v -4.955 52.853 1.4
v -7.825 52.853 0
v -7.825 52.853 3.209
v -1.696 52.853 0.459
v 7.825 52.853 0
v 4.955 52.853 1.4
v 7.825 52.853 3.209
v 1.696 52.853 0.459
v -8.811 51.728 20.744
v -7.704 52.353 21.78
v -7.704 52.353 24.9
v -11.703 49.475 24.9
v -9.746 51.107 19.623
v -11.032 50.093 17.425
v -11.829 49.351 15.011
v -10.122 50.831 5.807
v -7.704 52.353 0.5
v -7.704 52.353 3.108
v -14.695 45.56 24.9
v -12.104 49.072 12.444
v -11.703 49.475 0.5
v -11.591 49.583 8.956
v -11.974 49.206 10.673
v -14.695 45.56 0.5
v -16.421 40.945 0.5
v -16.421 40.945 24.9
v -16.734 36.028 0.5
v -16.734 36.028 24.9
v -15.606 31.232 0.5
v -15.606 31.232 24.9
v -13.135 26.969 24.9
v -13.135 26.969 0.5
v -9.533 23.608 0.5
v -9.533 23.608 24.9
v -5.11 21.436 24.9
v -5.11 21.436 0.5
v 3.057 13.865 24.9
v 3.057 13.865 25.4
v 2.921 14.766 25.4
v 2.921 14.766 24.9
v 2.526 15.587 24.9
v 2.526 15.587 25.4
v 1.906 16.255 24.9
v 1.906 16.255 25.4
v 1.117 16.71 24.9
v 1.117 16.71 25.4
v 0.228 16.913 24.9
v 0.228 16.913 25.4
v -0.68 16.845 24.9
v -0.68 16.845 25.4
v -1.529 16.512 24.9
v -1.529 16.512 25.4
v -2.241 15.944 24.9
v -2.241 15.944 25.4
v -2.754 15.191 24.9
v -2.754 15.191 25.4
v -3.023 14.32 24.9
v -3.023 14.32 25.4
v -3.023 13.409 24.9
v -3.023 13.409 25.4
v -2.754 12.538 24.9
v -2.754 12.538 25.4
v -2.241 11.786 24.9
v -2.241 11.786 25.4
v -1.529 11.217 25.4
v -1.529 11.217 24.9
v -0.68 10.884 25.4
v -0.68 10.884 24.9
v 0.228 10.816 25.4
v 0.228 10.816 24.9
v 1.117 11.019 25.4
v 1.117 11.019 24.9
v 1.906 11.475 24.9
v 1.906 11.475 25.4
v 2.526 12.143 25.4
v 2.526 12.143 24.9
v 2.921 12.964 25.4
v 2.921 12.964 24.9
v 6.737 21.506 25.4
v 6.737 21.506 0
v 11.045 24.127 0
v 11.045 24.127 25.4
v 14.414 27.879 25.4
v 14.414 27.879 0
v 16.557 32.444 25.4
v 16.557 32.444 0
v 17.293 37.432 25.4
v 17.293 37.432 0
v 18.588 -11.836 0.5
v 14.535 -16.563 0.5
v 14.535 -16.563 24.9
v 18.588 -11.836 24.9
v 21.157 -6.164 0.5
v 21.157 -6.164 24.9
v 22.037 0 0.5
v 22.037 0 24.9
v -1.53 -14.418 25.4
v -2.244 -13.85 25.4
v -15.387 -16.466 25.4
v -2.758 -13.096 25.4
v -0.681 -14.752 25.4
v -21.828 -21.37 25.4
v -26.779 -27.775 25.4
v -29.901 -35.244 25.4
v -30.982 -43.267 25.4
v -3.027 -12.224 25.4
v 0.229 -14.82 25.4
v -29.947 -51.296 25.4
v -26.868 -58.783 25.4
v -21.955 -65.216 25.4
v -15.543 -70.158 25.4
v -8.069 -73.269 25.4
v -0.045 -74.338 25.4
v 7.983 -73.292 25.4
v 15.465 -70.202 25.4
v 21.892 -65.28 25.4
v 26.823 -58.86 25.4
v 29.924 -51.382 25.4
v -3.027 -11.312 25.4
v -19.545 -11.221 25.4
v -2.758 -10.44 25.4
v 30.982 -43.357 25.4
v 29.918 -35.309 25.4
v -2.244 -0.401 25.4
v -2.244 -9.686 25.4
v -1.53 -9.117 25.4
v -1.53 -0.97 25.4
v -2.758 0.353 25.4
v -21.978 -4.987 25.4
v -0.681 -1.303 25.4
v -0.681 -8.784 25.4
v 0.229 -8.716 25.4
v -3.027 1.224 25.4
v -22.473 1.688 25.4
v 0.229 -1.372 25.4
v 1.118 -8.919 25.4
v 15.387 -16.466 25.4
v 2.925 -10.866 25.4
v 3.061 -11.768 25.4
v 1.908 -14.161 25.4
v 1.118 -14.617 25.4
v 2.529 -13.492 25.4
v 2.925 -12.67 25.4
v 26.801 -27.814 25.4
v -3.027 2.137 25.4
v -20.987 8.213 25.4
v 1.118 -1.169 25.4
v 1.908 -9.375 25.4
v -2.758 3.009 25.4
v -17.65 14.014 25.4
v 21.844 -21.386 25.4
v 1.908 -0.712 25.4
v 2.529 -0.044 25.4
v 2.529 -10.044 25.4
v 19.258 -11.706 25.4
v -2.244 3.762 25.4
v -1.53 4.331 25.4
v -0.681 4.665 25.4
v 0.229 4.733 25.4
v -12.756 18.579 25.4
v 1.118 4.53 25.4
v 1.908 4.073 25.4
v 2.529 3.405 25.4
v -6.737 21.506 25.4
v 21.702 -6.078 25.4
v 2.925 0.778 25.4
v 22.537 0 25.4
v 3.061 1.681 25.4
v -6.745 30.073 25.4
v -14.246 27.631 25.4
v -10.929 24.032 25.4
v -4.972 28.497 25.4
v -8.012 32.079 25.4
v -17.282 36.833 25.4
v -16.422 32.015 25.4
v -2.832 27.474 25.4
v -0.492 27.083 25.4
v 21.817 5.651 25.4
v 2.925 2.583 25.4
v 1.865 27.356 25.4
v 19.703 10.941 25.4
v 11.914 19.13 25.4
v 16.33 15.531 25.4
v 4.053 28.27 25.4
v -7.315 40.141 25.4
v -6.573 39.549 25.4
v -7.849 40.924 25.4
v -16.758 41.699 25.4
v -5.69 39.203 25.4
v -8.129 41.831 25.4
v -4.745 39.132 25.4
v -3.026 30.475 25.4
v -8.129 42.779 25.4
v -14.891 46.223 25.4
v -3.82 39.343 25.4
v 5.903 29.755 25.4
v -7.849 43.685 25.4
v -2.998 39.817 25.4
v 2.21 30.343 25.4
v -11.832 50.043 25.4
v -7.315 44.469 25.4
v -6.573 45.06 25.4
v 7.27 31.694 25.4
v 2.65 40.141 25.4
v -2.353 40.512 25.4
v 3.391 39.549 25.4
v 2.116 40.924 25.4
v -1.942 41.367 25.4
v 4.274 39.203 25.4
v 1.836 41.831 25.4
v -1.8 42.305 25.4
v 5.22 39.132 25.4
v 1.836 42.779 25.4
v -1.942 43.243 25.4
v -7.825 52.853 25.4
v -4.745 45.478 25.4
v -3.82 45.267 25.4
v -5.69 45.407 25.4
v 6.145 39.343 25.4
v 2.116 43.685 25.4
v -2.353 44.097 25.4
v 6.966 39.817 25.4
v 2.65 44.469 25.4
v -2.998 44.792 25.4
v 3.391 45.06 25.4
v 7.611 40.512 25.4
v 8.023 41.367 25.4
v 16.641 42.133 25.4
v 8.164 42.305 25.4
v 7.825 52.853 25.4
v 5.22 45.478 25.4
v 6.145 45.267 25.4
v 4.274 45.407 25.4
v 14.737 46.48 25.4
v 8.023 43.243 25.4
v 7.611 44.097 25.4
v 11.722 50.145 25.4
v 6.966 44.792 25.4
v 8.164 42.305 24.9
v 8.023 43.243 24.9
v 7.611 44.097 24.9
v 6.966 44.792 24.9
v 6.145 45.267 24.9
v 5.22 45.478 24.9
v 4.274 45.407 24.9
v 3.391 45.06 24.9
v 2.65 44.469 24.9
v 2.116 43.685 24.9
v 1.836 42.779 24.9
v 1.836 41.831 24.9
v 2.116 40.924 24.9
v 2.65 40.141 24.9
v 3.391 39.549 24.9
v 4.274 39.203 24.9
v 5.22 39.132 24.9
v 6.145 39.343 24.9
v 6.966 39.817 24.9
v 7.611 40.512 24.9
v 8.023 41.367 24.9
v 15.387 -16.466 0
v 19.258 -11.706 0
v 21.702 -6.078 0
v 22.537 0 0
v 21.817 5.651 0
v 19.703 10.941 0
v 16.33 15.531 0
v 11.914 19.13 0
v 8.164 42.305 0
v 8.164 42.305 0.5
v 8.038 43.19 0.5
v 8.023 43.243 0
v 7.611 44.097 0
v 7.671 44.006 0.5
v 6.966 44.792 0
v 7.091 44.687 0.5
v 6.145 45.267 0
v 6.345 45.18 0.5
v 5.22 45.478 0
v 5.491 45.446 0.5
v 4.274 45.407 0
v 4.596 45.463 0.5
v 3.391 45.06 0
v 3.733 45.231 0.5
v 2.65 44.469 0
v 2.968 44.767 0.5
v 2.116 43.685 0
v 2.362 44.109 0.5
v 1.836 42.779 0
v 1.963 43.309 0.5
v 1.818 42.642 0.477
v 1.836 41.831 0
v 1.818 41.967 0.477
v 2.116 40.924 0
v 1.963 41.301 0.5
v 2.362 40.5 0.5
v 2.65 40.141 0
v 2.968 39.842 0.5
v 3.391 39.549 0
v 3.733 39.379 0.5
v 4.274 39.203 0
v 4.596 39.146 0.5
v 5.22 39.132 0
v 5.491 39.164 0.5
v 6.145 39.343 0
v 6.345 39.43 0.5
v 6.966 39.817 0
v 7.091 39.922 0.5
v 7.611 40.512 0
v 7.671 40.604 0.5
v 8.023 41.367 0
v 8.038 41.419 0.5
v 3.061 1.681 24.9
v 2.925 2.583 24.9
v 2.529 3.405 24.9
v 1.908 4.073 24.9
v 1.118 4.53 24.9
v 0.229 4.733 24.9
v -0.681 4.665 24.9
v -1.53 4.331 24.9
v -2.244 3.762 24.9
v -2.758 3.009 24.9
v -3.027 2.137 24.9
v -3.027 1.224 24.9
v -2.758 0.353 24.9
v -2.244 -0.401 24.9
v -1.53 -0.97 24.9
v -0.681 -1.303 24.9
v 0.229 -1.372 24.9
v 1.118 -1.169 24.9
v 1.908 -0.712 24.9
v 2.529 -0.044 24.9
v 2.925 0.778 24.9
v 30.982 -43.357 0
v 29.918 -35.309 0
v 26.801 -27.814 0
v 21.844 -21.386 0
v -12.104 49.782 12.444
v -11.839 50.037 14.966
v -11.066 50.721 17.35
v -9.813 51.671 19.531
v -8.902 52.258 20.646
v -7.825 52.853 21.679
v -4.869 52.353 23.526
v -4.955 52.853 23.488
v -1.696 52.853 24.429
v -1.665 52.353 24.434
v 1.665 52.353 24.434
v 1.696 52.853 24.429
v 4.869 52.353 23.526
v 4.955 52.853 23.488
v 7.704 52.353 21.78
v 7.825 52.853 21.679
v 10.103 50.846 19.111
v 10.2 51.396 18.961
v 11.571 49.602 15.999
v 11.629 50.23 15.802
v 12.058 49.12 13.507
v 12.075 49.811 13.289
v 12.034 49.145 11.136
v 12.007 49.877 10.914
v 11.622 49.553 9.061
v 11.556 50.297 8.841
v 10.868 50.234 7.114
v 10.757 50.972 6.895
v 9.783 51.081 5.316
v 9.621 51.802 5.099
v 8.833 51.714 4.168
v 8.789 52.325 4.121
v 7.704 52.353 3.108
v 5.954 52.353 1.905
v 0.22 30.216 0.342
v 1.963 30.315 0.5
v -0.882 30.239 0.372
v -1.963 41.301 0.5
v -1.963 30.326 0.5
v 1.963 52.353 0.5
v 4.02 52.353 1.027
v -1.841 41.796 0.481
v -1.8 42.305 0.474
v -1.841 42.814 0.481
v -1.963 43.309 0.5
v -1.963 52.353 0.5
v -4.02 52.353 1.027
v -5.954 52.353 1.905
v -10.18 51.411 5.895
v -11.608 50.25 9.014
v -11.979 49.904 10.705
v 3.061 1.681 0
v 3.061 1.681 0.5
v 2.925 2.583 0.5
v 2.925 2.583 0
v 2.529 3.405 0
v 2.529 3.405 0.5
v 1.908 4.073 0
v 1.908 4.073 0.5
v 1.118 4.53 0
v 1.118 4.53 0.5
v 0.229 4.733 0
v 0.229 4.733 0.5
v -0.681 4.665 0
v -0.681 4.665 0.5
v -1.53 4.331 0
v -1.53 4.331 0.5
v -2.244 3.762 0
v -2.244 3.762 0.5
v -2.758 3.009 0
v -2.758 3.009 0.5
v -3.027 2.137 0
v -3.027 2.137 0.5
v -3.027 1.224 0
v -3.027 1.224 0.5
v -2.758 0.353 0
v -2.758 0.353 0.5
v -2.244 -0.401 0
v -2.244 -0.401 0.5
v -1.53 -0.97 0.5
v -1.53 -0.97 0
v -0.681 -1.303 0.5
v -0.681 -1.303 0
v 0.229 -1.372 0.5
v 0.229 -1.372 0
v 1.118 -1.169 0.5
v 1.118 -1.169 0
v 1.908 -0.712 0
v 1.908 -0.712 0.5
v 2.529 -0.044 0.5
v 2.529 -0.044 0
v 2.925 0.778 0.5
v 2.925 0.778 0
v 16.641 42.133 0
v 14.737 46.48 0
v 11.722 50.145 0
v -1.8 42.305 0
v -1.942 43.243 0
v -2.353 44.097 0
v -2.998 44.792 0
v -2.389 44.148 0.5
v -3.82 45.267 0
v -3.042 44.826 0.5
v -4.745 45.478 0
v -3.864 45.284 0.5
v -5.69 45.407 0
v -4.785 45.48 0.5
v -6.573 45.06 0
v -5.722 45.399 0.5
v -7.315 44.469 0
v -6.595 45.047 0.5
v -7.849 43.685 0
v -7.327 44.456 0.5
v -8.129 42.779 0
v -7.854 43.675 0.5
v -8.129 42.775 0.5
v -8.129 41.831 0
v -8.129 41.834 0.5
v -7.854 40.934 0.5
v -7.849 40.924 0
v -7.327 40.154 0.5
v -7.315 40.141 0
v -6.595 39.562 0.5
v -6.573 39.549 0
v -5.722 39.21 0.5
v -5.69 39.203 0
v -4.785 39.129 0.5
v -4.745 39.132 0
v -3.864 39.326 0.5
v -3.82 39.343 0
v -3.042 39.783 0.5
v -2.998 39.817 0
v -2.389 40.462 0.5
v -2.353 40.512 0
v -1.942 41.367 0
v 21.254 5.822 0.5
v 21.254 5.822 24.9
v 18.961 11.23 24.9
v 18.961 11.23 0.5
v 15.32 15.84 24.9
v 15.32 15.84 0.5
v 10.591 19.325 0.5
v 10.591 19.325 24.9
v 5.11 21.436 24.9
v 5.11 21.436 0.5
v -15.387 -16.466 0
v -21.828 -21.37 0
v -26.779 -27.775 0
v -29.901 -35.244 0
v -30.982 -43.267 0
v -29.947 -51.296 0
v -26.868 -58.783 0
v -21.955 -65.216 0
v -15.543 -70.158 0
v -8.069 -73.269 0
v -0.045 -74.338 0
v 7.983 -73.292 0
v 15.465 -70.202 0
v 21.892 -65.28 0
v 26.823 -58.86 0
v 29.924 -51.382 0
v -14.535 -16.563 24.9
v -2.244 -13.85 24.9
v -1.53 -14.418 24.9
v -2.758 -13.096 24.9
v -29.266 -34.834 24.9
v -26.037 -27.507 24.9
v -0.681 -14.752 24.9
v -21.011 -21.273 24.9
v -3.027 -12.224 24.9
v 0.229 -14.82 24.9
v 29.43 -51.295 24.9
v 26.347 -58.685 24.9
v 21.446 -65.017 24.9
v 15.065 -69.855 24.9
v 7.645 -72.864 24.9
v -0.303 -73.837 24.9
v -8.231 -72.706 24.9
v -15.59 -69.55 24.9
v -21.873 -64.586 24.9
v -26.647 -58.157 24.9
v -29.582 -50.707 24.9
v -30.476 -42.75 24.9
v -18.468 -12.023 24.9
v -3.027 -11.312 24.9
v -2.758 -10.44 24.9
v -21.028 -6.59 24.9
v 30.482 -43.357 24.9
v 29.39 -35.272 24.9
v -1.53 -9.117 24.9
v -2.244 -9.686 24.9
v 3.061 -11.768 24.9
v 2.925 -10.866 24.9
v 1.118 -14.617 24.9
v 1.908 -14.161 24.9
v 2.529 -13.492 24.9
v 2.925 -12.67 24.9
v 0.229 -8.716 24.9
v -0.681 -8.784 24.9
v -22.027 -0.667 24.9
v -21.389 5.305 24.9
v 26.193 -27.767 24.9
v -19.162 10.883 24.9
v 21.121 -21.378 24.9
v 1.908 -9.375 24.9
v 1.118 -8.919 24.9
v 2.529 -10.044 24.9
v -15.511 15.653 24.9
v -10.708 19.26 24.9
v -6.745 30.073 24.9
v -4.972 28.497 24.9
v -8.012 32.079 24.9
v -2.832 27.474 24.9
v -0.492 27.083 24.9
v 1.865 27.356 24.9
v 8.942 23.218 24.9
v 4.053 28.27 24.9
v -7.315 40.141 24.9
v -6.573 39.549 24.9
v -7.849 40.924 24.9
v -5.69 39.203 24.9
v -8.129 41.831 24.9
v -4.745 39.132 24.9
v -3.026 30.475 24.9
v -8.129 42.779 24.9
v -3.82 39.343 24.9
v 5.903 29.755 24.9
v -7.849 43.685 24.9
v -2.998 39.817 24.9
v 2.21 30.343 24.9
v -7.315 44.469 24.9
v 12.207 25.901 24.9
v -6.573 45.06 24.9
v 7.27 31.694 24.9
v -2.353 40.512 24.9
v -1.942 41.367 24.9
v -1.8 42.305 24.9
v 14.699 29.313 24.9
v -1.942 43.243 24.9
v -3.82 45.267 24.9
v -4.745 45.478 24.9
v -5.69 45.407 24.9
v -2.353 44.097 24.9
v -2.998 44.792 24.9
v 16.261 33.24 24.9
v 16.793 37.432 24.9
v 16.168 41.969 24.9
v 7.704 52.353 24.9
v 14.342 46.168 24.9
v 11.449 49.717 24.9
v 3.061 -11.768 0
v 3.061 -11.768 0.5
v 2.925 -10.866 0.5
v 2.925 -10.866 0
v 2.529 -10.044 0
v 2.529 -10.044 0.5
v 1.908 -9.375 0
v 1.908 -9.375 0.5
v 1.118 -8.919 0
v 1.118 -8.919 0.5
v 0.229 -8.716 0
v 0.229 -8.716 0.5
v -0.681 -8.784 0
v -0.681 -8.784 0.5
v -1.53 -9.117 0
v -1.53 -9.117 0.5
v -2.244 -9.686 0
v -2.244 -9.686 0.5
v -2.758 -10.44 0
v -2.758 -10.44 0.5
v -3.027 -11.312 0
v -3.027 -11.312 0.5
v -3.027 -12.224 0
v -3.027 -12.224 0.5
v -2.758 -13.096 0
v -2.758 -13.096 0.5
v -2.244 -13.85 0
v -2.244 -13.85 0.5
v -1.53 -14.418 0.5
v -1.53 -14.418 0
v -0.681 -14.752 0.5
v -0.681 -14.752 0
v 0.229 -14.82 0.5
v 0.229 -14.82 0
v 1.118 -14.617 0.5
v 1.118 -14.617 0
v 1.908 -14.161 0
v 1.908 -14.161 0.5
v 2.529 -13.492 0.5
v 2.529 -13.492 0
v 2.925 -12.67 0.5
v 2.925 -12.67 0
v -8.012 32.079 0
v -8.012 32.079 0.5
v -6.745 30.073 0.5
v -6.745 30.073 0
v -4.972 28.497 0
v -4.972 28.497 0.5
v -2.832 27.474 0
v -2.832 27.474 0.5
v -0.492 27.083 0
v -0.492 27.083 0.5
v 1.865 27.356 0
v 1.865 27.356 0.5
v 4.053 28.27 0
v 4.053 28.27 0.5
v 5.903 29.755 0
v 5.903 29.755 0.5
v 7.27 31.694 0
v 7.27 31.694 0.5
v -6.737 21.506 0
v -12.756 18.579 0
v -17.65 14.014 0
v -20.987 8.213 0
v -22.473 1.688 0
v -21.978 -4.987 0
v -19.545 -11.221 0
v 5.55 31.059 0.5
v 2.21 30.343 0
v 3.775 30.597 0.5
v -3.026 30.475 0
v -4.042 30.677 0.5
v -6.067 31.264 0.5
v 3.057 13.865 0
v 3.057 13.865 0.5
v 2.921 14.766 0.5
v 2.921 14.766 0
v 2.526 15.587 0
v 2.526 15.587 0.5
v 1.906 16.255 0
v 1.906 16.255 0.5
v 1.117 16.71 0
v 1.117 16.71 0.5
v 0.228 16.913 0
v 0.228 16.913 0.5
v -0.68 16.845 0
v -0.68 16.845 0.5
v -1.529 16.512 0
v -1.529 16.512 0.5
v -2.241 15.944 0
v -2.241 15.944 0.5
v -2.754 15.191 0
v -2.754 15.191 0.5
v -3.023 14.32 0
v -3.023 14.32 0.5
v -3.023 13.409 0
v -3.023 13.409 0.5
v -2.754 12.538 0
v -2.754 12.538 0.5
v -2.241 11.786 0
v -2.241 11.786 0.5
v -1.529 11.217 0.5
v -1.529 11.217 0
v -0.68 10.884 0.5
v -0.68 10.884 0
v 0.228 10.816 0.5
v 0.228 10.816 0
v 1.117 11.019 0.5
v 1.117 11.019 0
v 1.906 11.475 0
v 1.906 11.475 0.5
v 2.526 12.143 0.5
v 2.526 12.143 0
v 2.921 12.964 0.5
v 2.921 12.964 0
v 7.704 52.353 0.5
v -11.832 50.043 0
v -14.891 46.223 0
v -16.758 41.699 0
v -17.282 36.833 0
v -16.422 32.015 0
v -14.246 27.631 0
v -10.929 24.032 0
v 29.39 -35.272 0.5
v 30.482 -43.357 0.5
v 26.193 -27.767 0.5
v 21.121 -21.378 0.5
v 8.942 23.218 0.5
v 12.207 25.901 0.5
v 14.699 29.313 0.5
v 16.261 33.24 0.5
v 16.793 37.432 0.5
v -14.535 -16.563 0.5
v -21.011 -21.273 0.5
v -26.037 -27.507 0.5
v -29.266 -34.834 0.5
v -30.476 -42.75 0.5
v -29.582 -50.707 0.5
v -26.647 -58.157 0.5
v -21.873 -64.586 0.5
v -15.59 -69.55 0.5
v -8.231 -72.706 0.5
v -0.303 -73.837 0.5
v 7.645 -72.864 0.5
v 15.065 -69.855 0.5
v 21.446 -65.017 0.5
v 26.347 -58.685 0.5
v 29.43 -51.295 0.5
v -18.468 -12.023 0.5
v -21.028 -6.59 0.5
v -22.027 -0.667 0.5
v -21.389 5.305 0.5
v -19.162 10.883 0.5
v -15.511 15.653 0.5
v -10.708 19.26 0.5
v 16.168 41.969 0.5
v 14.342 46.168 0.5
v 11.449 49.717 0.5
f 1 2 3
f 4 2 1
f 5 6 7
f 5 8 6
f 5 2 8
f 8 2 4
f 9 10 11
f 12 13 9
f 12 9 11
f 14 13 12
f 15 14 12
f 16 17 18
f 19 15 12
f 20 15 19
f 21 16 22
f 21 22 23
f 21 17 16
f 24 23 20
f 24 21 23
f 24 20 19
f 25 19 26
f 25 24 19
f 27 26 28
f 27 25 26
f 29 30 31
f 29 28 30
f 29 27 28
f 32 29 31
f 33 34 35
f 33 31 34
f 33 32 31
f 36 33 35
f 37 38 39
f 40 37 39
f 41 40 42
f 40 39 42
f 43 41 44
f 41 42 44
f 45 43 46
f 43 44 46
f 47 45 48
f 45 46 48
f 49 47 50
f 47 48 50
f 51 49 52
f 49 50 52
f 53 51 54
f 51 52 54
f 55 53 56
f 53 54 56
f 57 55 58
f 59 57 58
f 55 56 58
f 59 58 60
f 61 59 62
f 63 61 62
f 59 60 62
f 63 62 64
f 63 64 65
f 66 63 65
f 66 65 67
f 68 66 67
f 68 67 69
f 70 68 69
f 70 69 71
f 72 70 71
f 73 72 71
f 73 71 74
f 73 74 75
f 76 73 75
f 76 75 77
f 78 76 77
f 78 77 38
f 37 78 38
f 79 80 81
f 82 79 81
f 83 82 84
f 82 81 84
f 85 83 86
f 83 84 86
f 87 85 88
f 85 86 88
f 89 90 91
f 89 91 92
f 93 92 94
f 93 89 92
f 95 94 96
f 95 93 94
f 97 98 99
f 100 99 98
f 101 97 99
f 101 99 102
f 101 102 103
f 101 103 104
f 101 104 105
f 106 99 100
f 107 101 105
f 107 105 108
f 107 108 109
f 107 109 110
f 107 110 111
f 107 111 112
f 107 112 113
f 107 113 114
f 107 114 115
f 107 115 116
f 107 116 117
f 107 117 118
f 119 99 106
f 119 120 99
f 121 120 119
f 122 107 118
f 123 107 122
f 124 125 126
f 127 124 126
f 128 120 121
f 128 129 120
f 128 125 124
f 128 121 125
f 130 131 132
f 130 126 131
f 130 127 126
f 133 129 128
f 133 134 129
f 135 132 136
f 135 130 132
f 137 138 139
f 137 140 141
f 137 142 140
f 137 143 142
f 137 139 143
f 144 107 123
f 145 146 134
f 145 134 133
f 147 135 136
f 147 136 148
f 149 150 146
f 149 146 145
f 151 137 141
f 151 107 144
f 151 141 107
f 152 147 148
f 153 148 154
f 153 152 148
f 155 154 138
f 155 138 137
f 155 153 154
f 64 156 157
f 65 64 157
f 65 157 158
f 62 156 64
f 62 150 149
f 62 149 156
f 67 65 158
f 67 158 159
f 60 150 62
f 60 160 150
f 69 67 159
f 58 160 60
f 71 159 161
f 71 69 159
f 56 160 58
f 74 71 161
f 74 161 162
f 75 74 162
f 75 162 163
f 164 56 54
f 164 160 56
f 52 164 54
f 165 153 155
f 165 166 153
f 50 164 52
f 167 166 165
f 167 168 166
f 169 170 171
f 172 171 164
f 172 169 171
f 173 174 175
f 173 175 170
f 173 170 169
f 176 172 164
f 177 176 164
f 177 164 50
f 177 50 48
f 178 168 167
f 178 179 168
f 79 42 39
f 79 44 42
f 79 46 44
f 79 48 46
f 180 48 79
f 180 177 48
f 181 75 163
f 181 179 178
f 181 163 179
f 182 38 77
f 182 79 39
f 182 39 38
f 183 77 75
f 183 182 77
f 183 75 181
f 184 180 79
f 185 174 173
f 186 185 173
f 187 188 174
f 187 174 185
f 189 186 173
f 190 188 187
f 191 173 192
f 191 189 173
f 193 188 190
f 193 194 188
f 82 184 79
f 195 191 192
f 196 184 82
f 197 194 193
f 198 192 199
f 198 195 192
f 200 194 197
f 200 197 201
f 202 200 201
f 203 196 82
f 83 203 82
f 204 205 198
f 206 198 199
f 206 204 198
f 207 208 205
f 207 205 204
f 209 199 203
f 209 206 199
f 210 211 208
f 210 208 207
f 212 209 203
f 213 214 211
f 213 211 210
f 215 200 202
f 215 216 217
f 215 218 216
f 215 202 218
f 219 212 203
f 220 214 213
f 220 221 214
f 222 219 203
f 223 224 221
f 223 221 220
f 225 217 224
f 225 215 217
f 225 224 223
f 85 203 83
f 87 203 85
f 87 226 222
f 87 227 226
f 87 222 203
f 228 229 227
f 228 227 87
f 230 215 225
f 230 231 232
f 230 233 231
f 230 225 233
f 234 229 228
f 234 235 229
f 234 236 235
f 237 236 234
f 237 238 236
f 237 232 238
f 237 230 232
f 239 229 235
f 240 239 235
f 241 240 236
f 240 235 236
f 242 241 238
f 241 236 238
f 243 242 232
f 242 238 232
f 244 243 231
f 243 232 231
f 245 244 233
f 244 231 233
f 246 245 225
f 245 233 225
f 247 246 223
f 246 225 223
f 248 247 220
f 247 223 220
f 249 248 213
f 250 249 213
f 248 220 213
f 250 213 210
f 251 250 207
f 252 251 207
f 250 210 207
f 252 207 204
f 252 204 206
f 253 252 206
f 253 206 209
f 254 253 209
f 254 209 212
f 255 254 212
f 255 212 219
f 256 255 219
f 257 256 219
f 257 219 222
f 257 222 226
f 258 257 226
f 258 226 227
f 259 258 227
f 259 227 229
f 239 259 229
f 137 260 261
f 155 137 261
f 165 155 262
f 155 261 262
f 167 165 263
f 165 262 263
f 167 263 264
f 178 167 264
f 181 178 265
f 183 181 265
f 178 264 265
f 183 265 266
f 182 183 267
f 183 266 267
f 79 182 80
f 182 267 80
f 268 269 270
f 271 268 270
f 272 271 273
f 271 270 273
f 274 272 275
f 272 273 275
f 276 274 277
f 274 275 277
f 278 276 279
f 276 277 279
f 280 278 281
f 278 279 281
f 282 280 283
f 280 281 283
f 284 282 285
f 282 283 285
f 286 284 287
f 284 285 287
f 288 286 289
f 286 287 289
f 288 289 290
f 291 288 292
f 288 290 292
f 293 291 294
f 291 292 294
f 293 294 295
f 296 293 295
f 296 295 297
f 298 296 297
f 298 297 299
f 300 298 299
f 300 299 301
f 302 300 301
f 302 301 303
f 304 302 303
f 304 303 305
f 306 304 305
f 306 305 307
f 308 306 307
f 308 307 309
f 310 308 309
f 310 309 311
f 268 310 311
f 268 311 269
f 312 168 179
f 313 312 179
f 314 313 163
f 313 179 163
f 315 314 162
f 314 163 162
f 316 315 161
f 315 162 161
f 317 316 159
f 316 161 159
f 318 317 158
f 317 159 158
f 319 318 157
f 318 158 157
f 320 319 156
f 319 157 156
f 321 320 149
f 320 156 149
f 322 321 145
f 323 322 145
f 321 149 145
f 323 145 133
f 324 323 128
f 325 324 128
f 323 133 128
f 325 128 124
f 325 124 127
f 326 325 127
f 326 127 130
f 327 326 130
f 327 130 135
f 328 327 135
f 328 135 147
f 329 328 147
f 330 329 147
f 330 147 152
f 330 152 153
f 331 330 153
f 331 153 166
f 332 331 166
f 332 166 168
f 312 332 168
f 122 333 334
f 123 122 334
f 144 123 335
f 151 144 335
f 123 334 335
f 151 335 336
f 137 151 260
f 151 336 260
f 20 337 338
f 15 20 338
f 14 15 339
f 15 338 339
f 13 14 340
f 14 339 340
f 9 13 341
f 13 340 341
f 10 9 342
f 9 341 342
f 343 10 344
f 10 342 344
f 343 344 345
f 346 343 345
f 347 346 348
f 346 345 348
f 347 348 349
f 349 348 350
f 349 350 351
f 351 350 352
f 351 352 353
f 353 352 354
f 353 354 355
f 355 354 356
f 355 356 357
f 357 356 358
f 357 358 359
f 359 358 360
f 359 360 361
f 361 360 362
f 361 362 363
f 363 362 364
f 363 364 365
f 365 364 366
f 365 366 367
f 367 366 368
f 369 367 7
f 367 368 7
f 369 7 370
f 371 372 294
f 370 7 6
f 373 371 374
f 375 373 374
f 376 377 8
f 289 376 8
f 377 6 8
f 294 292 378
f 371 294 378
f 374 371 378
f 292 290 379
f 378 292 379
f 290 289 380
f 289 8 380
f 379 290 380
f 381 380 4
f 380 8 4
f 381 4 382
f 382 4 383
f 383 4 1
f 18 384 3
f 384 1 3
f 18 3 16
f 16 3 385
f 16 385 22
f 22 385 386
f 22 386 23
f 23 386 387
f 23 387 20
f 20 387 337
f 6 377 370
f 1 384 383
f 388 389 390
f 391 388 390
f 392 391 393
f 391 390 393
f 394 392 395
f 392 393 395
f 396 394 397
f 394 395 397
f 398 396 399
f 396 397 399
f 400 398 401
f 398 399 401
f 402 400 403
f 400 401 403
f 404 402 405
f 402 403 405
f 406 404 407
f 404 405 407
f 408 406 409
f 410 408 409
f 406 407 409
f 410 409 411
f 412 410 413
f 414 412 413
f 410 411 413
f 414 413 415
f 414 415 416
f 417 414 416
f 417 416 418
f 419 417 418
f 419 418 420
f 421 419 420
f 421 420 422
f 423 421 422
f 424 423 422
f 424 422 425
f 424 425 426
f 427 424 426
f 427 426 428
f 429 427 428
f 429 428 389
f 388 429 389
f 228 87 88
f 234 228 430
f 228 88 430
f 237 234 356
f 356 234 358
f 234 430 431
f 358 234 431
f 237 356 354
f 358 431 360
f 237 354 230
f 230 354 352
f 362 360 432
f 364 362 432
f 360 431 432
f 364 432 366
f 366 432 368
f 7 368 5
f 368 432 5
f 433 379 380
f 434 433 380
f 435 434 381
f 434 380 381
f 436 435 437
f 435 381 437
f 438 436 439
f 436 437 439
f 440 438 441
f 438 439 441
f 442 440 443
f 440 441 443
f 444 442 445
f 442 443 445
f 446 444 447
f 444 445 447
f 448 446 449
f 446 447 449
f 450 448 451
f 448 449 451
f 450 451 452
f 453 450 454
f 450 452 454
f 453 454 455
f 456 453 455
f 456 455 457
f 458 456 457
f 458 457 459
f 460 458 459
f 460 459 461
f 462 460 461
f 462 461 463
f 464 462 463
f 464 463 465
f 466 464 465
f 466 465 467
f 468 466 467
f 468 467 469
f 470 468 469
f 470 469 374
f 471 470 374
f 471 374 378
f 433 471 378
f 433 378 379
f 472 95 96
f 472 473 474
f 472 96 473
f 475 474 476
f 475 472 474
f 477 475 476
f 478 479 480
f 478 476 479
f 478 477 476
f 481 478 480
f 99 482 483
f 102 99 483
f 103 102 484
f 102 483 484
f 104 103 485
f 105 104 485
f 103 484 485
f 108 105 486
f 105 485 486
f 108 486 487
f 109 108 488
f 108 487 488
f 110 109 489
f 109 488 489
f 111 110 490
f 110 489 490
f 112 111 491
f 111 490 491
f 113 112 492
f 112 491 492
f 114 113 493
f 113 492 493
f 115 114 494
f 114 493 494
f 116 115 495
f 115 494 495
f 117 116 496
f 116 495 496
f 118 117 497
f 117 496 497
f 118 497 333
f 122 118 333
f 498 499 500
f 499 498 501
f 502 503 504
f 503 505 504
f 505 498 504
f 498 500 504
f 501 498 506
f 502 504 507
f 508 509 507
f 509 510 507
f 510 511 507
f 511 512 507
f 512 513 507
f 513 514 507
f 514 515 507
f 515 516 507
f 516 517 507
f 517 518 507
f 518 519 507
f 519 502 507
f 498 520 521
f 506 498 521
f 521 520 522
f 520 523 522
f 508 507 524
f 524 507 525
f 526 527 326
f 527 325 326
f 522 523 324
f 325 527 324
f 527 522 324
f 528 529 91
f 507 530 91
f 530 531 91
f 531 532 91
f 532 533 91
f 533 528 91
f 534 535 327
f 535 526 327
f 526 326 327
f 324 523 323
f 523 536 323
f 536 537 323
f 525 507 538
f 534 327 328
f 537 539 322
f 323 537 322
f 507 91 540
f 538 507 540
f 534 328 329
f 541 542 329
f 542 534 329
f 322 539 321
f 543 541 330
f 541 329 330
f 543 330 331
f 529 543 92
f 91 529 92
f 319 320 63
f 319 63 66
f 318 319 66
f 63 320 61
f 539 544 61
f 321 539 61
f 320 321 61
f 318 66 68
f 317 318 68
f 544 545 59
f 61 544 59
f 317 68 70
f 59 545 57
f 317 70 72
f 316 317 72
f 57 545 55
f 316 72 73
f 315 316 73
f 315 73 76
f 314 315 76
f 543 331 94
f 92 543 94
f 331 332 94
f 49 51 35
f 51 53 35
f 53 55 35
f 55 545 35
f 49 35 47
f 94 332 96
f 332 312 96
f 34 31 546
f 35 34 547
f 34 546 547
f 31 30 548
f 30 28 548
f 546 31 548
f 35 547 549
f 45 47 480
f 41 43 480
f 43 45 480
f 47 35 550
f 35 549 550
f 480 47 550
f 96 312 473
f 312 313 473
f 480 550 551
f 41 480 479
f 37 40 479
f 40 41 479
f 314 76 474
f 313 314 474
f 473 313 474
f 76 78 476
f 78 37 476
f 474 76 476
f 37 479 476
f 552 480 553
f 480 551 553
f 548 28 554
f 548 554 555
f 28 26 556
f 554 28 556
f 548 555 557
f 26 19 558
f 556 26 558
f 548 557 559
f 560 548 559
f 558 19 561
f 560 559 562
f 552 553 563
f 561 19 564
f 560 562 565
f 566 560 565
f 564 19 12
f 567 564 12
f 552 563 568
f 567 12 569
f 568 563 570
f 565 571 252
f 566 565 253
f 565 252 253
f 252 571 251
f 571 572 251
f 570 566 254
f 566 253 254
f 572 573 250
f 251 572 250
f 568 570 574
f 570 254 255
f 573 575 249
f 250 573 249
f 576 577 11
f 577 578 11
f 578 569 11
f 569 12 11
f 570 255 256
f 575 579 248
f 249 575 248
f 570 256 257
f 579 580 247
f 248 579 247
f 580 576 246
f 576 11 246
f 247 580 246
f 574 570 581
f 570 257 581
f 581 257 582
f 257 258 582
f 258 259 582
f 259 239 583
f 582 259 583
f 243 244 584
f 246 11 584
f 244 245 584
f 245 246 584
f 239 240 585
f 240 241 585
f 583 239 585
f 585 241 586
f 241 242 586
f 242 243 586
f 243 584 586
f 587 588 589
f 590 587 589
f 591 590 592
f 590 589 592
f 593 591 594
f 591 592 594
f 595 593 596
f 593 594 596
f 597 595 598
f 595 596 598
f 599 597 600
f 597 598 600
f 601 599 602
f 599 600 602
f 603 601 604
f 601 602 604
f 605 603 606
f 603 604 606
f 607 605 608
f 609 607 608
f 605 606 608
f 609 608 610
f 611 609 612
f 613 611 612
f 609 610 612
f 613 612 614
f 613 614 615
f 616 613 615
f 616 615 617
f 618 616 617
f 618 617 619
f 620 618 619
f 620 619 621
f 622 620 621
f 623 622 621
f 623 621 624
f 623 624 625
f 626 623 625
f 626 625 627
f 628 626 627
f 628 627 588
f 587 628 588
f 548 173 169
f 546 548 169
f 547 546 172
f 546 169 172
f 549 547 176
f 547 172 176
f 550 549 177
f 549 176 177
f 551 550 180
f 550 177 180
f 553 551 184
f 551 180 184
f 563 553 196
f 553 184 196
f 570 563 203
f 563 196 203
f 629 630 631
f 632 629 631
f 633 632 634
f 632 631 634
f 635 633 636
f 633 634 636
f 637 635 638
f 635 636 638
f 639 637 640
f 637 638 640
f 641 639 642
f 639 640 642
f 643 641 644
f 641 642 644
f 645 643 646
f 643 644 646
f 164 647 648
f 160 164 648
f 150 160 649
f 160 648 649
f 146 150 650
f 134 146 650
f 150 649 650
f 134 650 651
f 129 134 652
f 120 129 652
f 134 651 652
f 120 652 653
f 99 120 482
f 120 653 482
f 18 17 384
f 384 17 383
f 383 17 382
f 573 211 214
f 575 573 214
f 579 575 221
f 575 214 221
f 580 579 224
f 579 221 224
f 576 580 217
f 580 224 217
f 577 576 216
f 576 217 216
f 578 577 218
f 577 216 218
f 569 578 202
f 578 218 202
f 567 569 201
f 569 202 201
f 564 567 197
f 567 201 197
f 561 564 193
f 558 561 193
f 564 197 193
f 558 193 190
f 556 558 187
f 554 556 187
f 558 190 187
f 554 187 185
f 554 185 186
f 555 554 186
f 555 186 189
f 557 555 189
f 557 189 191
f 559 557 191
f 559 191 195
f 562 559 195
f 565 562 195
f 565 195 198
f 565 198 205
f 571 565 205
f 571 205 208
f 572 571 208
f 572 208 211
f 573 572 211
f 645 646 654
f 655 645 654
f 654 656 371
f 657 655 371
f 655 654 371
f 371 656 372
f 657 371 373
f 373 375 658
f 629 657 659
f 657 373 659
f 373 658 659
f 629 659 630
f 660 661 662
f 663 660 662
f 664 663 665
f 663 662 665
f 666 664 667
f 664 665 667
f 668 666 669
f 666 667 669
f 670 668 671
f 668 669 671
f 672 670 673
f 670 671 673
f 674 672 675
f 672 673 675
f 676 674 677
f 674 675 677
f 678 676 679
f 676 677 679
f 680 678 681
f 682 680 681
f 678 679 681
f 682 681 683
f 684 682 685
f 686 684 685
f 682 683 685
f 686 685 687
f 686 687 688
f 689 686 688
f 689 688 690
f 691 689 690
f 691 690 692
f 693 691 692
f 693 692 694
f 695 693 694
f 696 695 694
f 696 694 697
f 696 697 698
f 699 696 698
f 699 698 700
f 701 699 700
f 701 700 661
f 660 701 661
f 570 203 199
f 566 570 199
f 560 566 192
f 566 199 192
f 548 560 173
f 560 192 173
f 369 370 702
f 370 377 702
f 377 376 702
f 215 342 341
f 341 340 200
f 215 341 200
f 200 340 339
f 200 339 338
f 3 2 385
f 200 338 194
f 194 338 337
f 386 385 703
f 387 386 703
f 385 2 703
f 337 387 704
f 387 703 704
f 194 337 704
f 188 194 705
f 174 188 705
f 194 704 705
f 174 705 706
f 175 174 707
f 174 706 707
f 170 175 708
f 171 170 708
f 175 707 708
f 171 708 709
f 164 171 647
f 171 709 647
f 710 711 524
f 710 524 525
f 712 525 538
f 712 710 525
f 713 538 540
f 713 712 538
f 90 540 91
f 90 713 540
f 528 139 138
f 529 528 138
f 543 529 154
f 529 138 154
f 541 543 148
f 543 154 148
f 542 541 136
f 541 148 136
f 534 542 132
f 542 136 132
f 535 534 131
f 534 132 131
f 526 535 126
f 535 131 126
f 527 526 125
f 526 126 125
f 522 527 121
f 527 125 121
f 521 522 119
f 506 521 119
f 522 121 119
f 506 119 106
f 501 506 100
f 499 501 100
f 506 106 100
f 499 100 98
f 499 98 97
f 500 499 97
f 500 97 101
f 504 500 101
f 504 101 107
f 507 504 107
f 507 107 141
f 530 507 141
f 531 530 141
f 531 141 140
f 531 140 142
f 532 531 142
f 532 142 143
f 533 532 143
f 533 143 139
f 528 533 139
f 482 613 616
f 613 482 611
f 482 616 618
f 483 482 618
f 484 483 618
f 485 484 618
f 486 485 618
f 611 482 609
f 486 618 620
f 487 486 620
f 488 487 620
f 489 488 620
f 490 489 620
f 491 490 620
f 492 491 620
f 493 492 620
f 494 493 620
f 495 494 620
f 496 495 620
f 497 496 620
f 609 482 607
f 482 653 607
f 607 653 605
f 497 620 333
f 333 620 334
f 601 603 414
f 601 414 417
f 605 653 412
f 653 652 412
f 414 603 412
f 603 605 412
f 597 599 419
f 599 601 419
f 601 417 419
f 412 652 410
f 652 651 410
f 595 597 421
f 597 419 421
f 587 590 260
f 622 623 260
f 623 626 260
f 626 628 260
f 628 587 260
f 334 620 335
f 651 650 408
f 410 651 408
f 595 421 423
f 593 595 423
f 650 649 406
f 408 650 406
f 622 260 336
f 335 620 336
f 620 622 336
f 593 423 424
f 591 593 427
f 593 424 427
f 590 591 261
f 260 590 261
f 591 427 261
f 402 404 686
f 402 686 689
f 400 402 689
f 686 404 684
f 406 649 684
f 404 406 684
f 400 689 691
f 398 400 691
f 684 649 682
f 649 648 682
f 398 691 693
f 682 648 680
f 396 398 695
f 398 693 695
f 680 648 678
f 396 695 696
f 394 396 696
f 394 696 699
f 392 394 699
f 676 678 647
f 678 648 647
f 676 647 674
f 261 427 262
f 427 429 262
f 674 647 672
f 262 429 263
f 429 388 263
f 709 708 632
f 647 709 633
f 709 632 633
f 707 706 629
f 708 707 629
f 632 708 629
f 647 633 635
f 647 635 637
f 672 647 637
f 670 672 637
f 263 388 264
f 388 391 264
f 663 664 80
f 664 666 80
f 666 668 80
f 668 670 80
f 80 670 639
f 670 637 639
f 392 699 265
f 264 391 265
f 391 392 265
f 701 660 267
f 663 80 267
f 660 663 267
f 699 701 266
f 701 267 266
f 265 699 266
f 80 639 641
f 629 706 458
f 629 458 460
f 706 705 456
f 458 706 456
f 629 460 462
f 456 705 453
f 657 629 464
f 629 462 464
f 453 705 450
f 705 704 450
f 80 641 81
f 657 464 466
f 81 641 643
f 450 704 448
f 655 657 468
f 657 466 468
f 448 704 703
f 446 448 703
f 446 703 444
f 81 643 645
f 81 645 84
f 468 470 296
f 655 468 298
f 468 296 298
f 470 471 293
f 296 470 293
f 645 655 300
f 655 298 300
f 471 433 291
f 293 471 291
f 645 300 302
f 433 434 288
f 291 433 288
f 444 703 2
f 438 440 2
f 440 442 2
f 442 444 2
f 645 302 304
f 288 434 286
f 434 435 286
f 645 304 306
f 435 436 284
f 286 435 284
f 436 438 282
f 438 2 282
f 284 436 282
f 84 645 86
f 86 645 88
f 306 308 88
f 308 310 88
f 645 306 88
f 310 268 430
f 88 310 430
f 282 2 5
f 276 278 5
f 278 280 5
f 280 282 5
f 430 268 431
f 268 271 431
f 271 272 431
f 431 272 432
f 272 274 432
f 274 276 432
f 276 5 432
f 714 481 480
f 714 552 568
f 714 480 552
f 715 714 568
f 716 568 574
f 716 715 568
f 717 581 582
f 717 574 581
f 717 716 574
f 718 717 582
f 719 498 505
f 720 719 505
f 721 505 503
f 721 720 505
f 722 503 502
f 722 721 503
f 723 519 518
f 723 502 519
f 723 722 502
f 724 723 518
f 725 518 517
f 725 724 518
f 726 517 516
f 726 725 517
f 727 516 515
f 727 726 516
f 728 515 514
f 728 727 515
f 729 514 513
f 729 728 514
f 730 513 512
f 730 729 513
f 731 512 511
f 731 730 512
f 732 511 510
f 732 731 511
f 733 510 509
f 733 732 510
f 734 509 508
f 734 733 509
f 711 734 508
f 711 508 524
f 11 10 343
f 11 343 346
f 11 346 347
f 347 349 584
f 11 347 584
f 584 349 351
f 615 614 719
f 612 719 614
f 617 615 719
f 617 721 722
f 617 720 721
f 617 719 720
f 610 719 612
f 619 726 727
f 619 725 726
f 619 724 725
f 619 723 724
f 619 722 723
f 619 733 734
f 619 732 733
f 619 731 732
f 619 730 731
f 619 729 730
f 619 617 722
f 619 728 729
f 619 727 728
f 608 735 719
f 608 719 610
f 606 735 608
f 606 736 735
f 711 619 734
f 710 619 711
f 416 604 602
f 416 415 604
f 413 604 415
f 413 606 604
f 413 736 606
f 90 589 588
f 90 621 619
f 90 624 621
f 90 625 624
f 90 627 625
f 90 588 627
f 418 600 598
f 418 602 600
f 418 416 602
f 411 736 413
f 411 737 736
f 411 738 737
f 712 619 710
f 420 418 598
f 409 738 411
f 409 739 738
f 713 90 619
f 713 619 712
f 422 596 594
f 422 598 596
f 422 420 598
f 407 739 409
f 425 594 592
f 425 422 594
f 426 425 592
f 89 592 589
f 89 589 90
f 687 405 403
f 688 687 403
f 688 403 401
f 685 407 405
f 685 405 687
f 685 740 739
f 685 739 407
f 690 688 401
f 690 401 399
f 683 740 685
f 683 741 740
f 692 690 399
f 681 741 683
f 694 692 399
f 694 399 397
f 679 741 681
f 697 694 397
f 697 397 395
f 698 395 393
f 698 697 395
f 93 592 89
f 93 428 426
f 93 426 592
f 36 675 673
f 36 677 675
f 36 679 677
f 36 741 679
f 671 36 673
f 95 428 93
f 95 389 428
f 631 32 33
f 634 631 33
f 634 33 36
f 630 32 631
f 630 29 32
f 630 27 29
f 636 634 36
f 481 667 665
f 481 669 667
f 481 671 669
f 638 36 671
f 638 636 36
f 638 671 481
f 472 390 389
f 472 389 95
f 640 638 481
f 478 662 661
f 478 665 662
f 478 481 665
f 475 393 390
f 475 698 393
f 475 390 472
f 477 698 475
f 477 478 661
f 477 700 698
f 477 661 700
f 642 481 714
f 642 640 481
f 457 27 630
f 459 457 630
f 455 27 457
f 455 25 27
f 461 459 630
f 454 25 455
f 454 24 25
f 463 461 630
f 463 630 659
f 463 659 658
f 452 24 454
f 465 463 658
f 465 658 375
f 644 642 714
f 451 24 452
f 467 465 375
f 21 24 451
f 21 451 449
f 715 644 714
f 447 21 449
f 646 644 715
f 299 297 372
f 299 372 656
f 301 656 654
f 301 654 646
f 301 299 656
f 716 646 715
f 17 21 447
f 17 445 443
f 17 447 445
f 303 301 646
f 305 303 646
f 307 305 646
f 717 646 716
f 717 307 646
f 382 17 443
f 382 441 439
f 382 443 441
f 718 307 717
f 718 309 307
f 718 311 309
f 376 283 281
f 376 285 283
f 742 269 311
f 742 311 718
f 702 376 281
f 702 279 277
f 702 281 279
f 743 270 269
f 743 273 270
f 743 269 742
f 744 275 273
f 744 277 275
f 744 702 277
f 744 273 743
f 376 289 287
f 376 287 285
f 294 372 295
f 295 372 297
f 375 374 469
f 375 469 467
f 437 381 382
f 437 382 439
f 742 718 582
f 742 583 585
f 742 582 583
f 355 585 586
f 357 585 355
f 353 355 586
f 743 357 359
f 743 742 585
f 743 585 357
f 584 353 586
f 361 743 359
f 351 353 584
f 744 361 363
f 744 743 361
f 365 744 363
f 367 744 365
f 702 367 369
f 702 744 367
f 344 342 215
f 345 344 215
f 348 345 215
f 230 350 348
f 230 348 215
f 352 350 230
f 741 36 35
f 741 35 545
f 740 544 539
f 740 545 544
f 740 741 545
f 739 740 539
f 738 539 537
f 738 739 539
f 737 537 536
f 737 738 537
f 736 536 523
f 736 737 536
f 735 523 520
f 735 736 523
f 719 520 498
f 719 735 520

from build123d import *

# Parameters (mm, degrees)
F1_DEPTH  = 25.4
F2_W      = 24.5687300339
F2_H      = 2.9094554484
F3_DEPTH  = 25.4
F4_T      = -0.5
F5_R      = 3.0570054972
F5_R_2    = 3.0607
F6_R      = 3.181794186
F8_DEPTH  = 25.4
F9_R      = 12.1043942534
F10_DEPTH = 25.4


with BuildPart() as f1:
    # F0 (on Top) → F1 (new body)
    with BuildSketch(Plane.XY):
        with BuildLine():
            ThreePointArc((6.7371355302, 21.506121056), (14.414150376, 27.8790390368), (17.2925723513, 37.4323278666))
            ThreePointArc((17.2925723513, 37.4323278666), (-9.5532888298, 51.8464782426), (-6.7371355302, 21.506121056))
            ThreePointArc((-6.7371355302, 21.506121056), (0, 22.5366864917), (6.7371355302, 21.506121056))
        make_face()
        with BuildLine():
            ThreePointArc((15.3873619303, -16.4660660406), (0, -22.5366864917), (-15.3873619303, -16.4660660406))
            ThreePointArc((-15.3873619303, -16.4660660406), (-15.5425277668, -70.157586494), (30.9817265156, -43.3565191925))
            ThreePointArc((30.9817265156, -43.3565191925), (26.8010673015, -27.8139914256), (15.3873619303, -16.4660660406))
        make_face()
        with BuildLine():
            ThreePointArc((6.7371355302, 21.506121056), (0, 22.5366864917), (-6.7371355302, 21.506121056))
            ThreePointArc((-6.7371355302, 21.506121056), (0, 20.1397555152), (6.7371355302, 21.506121056))
        make_face()
        with BuildLine():
            ThreePointArc((6.7371355302, 21.506121056), (0, 20.1397555152), (-6.7371355302, 21.506121056))
            ThreePointArc((-6.7371355302, 21.506121056), (-21.9737364868, 5.0057110217), (-15.3873619303, -16.4660660406))
            ThreePointArc((-15.3873619303, -16.4660660406), (0, -12.3747926769), (15.3873619303, -16.4660660406))
            ThreePointArc((15.3873619303, -16.4660660406), (20.6722324603, -8.9755803787), (22.5366864917, 0))
            ThreePointArc((22.5366864917, 0), (18.1622541184, 13.3429668127), (6.7371355302, 21.506121056))
        make_face()
        with BuildLine():
            ThreePointArc((15.3873619303, -16.4660660406), (0, -12.3747926769), (-15.3873619303, -16.4660660406))
            ThreePointArc((-15.3873619303, -16.4660660406), (0, -22.5366864917), (15.3873619303, -16.4660660406))
        make_face()
    extrude(amount=F1_DEPTH)

    # F2 (on Top) → F3 (cut)
    with BuildSketch(Plane.XY):
        with Locations((4.657e-07, 54.3079804629)):
            Rectangle(F2_W, F2_H)
    extrude(amount=F3_DEPTH, mode=Mode.SUBTRACT)

    # F4 (hollow: no face is removed)
    offset(amount=F4_T, kind=Kind.INTERSECTION, mode=Mode.SUBTRACT)

    # F5 (on face) + F6 (on face) + F7 (on face) → F8 (cut)
    with BuildSketch(Plane.XY.offset(25.4)):
        with Locations((0, 13.8647966087)):
            Circle(F5_R)
        with Locations((0, 1.6805409687)):
            Circle(F5_R_2)
        with Locations((0, -11.7677608505)):
            Circle(F5_R_2)
    with BuildSketch(Plane.XY.offset(25.4)):
        with Locations((-4.9822856672, 42.3047989607)):
            Circle(F6_R)
        with Locations((4.9822856672, 42.3047989607)):
            Circle(F6_R)
    with BuildSketch(Plane.XY.offset(25.4)):
        with BuildLine():
            ThreePointArc((7.2696800344, 31.6944643855), (-0.4129284645, 30.2212155736), (-8.011739701, 32.0789031684))
            ThreePointArc((-8.011739701, 32.0789031684), (-0.4918764169, 27.0830389619), (7.2696800344, 31.6944643855))
        make_face()
    extrude(amount=-F8_DEPTH, mode=Mode.SUBTRACT)

    # F9 (on face) → F10 (cut)
    with BuildSketch(Plane(origin=(0, 52.8532527387, 0), x_dir=(-1, 0, 0), z_dir=(0, 1, 0))):
        with Locations((0, 12.44416181)):
            Circle(F9_R)
    extrude(amount=-F10_DEPTH, mode=Mode.SUBTRACT)


solid = f1.part
